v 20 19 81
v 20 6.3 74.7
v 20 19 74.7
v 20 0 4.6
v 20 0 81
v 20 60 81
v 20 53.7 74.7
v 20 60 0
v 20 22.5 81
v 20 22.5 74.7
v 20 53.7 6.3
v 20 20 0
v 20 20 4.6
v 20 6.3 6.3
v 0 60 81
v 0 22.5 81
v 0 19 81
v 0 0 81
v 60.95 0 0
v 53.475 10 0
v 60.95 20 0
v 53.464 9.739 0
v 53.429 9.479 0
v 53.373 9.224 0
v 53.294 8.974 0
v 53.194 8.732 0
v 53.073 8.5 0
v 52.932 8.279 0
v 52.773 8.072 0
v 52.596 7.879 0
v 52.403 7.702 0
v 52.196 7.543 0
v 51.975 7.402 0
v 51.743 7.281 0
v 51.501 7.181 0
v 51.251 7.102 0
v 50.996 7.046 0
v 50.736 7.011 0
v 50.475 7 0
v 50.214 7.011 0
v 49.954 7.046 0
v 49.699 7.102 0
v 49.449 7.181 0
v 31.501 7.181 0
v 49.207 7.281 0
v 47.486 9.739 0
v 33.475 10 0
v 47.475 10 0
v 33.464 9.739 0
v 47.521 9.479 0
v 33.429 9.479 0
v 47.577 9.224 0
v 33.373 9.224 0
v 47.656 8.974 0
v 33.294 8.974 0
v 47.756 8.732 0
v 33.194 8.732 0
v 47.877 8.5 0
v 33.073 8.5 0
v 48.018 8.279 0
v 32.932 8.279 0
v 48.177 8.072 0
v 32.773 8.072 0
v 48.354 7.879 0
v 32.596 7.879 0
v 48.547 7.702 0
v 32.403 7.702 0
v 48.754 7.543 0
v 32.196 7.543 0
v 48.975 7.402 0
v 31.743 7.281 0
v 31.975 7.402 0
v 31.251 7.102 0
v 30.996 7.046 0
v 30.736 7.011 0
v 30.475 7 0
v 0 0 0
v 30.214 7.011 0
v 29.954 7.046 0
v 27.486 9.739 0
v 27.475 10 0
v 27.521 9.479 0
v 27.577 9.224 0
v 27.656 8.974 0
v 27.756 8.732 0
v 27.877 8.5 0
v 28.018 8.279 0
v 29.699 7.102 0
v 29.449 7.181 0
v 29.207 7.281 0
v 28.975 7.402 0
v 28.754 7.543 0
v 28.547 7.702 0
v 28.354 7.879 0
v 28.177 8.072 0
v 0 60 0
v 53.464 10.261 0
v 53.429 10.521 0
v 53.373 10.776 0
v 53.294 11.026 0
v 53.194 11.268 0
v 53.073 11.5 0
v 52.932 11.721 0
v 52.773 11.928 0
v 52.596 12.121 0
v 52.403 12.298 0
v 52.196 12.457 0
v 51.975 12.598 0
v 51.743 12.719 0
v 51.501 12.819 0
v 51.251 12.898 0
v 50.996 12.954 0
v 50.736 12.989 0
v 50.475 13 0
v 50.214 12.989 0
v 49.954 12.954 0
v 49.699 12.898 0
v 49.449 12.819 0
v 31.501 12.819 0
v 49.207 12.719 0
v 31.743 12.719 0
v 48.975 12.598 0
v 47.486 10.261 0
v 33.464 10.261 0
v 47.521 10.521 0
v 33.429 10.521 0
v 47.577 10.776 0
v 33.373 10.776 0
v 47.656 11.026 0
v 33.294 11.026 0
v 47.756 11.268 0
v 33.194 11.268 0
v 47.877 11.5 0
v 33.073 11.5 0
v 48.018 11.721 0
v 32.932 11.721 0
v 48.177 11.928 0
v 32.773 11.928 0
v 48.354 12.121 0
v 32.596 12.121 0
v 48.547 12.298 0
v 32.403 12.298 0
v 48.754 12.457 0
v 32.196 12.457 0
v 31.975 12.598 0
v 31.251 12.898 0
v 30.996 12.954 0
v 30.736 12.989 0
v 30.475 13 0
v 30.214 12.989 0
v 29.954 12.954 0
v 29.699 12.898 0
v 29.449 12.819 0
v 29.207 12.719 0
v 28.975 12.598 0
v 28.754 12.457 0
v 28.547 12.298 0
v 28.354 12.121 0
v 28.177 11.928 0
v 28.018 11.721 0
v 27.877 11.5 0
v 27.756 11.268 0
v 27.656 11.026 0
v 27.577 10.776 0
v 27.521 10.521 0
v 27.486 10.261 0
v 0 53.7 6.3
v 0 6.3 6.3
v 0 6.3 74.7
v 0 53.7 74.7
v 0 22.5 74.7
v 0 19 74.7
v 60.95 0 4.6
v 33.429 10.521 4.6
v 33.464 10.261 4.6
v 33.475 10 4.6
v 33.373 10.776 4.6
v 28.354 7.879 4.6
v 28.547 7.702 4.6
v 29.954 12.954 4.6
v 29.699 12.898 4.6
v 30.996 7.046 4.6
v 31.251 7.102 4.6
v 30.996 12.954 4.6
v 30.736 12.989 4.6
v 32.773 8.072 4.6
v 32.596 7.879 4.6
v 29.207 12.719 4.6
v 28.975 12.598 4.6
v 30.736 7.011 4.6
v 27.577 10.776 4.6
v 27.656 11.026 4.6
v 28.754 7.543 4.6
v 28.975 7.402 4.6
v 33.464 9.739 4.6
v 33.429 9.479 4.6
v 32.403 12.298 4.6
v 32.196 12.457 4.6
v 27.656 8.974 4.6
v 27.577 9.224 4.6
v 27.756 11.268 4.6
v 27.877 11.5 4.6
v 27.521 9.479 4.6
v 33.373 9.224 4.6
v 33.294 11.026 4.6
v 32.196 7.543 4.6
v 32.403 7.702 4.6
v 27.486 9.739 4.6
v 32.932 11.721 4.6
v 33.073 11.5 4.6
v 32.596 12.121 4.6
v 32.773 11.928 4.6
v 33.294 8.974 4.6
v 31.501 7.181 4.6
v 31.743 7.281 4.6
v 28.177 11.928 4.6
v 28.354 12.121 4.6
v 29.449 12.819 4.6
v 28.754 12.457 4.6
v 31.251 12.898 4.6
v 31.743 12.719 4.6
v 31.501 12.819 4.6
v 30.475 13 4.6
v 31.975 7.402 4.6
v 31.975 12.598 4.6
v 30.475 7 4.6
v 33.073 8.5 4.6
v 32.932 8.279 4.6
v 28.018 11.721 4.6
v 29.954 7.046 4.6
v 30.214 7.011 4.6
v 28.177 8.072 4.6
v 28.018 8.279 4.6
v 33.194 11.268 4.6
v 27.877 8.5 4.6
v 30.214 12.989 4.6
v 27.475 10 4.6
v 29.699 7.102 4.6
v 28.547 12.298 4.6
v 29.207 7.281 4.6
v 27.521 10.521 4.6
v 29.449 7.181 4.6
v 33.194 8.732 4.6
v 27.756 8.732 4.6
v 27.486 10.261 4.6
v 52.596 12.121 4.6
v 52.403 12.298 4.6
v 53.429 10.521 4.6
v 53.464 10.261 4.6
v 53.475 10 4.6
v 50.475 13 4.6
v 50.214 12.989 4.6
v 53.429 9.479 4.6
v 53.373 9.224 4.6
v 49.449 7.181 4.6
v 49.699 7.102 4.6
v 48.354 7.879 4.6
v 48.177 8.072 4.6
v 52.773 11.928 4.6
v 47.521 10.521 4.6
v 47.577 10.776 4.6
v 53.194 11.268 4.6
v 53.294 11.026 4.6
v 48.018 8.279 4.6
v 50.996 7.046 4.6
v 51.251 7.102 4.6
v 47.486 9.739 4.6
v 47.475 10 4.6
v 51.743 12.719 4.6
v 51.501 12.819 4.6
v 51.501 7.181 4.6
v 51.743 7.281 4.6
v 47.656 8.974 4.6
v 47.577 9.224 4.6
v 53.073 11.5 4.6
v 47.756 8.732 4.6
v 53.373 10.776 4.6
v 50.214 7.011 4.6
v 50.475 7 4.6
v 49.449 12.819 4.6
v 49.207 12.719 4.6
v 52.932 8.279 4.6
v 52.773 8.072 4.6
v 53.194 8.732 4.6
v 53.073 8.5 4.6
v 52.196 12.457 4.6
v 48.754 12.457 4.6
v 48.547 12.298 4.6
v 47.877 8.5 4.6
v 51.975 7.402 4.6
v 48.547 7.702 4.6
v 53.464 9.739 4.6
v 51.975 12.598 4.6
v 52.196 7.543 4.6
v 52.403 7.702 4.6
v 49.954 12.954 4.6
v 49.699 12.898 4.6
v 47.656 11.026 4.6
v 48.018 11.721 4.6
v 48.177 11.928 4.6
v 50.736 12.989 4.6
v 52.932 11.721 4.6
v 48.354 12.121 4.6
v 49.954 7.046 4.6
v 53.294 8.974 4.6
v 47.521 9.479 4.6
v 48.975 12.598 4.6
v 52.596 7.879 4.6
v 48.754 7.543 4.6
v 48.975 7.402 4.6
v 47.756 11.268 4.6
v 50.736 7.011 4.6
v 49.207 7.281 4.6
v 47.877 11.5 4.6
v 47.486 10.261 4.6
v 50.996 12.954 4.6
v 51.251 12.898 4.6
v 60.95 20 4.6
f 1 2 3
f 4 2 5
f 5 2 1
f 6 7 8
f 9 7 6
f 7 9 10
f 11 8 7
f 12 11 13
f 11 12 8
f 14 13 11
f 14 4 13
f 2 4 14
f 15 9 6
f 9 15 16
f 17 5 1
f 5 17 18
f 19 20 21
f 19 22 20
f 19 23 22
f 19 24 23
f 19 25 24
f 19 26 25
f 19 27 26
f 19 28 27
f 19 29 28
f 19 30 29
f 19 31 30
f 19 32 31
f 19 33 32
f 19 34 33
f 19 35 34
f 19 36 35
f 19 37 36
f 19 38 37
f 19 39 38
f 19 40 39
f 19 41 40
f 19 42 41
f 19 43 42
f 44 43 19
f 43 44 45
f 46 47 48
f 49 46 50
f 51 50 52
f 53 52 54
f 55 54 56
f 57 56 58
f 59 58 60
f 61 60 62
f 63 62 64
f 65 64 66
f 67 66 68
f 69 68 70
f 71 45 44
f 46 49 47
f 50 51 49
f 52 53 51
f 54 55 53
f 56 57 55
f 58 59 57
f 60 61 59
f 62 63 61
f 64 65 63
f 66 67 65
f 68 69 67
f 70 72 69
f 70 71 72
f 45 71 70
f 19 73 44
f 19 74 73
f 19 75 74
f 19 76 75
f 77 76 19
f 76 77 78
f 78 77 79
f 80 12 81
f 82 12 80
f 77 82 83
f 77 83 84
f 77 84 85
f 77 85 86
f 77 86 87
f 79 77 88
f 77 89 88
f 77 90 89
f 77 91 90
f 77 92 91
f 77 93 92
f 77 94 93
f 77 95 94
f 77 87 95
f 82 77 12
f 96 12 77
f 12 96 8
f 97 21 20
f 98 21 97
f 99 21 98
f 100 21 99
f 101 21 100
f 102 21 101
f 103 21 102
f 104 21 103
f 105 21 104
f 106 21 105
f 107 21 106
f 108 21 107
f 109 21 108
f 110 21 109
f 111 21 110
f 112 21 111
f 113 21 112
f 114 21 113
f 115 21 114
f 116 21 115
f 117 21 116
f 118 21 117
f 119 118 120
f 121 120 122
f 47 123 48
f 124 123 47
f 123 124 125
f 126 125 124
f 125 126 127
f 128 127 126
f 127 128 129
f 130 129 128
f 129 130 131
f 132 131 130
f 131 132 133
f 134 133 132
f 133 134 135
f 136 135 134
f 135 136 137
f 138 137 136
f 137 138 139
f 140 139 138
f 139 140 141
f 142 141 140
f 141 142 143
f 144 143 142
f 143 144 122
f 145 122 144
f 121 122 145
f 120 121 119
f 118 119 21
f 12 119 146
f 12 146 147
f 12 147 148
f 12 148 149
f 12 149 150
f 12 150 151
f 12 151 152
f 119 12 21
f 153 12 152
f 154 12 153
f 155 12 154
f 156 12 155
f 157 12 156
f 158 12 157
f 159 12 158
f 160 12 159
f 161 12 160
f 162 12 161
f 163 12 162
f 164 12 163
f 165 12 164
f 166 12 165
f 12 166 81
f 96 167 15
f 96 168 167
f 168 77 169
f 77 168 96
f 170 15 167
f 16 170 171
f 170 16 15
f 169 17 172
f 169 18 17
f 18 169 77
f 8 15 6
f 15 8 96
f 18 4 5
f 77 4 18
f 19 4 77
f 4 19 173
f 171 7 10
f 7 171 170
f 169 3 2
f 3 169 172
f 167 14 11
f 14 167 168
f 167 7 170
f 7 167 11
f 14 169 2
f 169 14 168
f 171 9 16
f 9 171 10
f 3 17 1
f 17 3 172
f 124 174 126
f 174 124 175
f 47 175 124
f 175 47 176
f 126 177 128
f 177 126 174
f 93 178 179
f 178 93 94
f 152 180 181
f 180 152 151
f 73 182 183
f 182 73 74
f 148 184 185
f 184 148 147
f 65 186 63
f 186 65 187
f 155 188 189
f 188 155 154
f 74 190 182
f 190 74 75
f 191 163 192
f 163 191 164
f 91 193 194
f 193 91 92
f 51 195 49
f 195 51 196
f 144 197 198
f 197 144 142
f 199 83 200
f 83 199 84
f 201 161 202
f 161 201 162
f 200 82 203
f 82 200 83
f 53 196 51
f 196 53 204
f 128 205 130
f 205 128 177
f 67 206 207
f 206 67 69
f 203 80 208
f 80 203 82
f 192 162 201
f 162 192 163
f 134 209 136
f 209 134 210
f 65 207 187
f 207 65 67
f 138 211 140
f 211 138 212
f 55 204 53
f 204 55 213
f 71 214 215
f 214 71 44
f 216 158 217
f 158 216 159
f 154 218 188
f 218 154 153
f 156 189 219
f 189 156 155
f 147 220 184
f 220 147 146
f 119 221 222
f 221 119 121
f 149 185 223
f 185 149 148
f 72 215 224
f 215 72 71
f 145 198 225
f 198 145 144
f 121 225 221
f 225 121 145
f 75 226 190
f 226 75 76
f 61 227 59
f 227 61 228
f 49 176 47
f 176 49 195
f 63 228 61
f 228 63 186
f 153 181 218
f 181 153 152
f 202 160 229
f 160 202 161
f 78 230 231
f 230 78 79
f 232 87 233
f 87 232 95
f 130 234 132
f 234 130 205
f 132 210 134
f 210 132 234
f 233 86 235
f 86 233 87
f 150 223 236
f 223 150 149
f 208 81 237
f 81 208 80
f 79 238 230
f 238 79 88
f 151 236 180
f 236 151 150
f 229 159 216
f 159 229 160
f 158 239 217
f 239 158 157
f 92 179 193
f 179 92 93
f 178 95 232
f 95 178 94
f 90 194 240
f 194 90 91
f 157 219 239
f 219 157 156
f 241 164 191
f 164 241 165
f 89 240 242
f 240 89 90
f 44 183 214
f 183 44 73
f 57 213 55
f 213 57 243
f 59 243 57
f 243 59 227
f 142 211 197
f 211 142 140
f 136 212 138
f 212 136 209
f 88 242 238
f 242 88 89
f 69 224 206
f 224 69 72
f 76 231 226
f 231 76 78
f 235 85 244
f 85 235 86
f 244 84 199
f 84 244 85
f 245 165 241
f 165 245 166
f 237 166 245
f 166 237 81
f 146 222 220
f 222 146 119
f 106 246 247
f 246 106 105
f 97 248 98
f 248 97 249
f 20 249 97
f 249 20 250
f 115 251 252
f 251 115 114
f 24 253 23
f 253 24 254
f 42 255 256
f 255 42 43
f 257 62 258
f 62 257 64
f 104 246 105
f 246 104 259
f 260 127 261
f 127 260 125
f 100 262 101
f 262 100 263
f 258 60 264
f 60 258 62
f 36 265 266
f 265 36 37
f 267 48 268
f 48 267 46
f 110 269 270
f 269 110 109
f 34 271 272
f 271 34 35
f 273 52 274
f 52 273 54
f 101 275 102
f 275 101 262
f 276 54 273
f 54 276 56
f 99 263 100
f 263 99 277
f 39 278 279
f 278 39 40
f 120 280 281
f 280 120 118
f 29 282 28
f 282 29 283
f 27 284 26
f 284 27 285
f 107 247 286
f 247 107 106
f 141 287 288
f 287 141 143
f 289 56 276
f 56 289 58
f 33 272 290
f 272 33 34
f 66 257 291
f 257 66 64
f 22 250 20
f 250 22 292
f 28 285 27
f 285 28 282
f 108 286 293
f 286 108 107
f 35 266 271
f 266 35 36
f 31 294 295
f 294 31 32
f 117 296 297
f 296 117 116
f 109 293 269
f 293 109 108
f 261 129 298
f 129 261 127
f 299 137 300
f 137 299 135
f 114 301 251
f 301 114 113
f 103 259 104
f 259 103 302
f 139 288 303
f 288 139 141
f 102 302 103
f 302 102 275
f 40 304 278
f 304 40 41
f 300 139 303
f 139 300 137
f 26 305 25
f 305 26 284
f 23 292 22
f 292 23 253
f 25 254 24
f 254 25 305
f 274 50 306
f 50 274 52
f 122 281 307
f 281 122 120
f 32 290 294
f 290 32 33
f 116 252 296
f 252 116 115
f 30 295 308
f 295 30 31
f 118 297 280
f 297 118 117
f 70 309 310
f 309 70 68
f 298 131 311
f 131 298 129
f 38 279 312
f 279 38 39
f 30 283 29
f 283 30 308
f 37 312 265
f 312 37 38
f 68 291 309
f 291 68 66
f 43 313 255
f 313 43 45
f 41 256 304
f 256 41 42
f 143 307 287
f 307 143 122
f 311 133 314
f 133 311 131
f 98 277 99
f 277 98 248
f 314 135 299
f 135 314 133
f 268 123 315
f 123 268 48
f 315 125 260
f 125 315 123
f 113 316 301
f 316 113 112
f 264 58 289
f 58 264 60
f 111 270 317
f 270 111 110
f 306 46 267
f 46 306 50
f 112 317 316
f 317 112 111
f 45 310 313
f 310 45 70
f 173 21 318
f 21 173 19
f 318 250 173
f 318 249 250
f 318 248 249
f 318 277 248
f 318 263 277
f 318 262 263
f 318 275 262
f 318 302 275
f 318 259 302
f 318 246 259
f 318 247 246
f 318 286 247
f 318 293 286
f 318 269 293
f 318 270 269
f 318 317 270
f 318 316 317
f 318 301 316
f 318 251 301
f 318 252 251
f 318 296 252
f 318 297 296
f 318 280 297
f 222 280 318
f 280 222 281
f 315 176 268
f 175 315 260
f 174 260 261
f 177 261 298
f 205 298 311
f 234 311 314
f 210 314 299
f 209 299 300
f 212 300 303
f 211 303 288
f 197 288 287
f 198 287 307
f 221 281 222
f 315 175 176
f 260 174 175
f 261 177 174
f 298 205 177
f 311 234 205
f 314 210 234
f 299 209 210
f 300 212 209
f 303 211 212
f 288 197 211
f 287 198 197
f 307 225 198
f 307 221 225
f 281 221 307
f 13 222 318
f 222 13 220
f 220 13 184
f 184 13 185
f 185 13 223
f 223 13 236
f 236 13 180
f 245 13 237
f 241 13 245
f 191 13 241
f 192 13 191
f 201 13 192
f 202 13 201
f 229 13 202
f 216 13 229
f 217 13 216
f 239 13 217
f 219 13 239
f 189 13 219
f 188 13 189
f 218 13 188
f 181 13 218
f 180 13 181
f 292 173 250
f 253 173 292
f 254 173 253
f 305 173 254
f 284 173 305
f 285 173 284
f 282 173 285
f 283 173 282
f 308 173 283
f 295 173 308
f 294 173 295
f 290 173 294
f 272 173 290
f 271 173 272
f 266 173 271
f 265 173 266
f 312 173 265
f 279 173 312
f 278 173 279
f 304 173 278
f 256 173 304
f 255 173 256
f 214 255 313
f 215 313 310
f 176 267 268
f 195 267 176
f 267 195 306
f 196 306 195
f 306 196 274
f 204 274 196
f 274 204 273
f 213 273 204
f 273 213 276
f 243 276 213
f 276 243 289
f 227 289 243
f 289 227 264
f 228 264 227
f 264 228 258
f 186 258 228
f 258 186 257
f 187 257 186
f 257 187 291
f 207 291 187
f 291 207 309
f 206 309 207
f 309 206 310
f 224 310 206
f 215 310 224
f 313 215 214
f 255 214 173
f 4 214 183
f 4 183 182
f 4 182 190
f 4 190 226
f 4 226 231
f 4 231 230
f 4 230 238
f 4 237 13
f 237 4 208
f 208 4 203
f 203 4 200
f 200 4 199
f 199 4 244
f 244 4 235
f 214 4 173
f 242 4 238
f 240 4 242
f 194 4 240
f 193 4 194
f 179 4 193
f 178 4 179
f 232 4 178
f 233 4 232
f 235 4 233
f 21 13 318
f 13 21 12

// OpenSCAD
/*difference() {
translate([32.5, -3.5-4.8-6.3, 3.0]) import("/home/curly/Downloads/Cable_Guide_90deg_large.stl");
rotate([0, 0, 180])cube(100);
}*/
/* thickness 4.5, 6.3, 19.0 */
/* gap 3.5 */
include <MCAD/units.scad>

$fn = 72;

in = 25.4;
/* pitch = 5/8 * in; */
/* margin = 1/4 * in; */

nut_cutout = 3/8 * in;
plate = 4.6;
eps = 0.1;
thickness = 6.3;
width = 60;
height = 81;
gap = 3.5;
gap_offset = 19.0;

pitch = 20.0;
margin = (pitch - nut_cutout);
ru = 2*pitch + 2*margin;

difference() {
	cube([pitch, width, height]);
	translate([-eps/2, thickness, thickness]) cube([pitch+eps, width-2*thickness, height-2*thickness]);
	translate([-eps/2, gap_offset, height-thickness-eps/2]) cube([pitch+eps, gap, thickness+eps]);
}
difference() {
	cube([ru, pitch, plate]);
	translate([pitch + margin, pitch/2, plate/2]) union() {
		cylinder(h=plate+eps, d=M6, center=true);
		%cube([13.72, 13.72, plate+eps], center=true);
		translate([pitch, 0, 0]) { 
			cylinder(h=plate+eps, d=M6,center=true);
			%cube([13.72, 13.72, plate+eps], center=true);
		}
		
	}
}
